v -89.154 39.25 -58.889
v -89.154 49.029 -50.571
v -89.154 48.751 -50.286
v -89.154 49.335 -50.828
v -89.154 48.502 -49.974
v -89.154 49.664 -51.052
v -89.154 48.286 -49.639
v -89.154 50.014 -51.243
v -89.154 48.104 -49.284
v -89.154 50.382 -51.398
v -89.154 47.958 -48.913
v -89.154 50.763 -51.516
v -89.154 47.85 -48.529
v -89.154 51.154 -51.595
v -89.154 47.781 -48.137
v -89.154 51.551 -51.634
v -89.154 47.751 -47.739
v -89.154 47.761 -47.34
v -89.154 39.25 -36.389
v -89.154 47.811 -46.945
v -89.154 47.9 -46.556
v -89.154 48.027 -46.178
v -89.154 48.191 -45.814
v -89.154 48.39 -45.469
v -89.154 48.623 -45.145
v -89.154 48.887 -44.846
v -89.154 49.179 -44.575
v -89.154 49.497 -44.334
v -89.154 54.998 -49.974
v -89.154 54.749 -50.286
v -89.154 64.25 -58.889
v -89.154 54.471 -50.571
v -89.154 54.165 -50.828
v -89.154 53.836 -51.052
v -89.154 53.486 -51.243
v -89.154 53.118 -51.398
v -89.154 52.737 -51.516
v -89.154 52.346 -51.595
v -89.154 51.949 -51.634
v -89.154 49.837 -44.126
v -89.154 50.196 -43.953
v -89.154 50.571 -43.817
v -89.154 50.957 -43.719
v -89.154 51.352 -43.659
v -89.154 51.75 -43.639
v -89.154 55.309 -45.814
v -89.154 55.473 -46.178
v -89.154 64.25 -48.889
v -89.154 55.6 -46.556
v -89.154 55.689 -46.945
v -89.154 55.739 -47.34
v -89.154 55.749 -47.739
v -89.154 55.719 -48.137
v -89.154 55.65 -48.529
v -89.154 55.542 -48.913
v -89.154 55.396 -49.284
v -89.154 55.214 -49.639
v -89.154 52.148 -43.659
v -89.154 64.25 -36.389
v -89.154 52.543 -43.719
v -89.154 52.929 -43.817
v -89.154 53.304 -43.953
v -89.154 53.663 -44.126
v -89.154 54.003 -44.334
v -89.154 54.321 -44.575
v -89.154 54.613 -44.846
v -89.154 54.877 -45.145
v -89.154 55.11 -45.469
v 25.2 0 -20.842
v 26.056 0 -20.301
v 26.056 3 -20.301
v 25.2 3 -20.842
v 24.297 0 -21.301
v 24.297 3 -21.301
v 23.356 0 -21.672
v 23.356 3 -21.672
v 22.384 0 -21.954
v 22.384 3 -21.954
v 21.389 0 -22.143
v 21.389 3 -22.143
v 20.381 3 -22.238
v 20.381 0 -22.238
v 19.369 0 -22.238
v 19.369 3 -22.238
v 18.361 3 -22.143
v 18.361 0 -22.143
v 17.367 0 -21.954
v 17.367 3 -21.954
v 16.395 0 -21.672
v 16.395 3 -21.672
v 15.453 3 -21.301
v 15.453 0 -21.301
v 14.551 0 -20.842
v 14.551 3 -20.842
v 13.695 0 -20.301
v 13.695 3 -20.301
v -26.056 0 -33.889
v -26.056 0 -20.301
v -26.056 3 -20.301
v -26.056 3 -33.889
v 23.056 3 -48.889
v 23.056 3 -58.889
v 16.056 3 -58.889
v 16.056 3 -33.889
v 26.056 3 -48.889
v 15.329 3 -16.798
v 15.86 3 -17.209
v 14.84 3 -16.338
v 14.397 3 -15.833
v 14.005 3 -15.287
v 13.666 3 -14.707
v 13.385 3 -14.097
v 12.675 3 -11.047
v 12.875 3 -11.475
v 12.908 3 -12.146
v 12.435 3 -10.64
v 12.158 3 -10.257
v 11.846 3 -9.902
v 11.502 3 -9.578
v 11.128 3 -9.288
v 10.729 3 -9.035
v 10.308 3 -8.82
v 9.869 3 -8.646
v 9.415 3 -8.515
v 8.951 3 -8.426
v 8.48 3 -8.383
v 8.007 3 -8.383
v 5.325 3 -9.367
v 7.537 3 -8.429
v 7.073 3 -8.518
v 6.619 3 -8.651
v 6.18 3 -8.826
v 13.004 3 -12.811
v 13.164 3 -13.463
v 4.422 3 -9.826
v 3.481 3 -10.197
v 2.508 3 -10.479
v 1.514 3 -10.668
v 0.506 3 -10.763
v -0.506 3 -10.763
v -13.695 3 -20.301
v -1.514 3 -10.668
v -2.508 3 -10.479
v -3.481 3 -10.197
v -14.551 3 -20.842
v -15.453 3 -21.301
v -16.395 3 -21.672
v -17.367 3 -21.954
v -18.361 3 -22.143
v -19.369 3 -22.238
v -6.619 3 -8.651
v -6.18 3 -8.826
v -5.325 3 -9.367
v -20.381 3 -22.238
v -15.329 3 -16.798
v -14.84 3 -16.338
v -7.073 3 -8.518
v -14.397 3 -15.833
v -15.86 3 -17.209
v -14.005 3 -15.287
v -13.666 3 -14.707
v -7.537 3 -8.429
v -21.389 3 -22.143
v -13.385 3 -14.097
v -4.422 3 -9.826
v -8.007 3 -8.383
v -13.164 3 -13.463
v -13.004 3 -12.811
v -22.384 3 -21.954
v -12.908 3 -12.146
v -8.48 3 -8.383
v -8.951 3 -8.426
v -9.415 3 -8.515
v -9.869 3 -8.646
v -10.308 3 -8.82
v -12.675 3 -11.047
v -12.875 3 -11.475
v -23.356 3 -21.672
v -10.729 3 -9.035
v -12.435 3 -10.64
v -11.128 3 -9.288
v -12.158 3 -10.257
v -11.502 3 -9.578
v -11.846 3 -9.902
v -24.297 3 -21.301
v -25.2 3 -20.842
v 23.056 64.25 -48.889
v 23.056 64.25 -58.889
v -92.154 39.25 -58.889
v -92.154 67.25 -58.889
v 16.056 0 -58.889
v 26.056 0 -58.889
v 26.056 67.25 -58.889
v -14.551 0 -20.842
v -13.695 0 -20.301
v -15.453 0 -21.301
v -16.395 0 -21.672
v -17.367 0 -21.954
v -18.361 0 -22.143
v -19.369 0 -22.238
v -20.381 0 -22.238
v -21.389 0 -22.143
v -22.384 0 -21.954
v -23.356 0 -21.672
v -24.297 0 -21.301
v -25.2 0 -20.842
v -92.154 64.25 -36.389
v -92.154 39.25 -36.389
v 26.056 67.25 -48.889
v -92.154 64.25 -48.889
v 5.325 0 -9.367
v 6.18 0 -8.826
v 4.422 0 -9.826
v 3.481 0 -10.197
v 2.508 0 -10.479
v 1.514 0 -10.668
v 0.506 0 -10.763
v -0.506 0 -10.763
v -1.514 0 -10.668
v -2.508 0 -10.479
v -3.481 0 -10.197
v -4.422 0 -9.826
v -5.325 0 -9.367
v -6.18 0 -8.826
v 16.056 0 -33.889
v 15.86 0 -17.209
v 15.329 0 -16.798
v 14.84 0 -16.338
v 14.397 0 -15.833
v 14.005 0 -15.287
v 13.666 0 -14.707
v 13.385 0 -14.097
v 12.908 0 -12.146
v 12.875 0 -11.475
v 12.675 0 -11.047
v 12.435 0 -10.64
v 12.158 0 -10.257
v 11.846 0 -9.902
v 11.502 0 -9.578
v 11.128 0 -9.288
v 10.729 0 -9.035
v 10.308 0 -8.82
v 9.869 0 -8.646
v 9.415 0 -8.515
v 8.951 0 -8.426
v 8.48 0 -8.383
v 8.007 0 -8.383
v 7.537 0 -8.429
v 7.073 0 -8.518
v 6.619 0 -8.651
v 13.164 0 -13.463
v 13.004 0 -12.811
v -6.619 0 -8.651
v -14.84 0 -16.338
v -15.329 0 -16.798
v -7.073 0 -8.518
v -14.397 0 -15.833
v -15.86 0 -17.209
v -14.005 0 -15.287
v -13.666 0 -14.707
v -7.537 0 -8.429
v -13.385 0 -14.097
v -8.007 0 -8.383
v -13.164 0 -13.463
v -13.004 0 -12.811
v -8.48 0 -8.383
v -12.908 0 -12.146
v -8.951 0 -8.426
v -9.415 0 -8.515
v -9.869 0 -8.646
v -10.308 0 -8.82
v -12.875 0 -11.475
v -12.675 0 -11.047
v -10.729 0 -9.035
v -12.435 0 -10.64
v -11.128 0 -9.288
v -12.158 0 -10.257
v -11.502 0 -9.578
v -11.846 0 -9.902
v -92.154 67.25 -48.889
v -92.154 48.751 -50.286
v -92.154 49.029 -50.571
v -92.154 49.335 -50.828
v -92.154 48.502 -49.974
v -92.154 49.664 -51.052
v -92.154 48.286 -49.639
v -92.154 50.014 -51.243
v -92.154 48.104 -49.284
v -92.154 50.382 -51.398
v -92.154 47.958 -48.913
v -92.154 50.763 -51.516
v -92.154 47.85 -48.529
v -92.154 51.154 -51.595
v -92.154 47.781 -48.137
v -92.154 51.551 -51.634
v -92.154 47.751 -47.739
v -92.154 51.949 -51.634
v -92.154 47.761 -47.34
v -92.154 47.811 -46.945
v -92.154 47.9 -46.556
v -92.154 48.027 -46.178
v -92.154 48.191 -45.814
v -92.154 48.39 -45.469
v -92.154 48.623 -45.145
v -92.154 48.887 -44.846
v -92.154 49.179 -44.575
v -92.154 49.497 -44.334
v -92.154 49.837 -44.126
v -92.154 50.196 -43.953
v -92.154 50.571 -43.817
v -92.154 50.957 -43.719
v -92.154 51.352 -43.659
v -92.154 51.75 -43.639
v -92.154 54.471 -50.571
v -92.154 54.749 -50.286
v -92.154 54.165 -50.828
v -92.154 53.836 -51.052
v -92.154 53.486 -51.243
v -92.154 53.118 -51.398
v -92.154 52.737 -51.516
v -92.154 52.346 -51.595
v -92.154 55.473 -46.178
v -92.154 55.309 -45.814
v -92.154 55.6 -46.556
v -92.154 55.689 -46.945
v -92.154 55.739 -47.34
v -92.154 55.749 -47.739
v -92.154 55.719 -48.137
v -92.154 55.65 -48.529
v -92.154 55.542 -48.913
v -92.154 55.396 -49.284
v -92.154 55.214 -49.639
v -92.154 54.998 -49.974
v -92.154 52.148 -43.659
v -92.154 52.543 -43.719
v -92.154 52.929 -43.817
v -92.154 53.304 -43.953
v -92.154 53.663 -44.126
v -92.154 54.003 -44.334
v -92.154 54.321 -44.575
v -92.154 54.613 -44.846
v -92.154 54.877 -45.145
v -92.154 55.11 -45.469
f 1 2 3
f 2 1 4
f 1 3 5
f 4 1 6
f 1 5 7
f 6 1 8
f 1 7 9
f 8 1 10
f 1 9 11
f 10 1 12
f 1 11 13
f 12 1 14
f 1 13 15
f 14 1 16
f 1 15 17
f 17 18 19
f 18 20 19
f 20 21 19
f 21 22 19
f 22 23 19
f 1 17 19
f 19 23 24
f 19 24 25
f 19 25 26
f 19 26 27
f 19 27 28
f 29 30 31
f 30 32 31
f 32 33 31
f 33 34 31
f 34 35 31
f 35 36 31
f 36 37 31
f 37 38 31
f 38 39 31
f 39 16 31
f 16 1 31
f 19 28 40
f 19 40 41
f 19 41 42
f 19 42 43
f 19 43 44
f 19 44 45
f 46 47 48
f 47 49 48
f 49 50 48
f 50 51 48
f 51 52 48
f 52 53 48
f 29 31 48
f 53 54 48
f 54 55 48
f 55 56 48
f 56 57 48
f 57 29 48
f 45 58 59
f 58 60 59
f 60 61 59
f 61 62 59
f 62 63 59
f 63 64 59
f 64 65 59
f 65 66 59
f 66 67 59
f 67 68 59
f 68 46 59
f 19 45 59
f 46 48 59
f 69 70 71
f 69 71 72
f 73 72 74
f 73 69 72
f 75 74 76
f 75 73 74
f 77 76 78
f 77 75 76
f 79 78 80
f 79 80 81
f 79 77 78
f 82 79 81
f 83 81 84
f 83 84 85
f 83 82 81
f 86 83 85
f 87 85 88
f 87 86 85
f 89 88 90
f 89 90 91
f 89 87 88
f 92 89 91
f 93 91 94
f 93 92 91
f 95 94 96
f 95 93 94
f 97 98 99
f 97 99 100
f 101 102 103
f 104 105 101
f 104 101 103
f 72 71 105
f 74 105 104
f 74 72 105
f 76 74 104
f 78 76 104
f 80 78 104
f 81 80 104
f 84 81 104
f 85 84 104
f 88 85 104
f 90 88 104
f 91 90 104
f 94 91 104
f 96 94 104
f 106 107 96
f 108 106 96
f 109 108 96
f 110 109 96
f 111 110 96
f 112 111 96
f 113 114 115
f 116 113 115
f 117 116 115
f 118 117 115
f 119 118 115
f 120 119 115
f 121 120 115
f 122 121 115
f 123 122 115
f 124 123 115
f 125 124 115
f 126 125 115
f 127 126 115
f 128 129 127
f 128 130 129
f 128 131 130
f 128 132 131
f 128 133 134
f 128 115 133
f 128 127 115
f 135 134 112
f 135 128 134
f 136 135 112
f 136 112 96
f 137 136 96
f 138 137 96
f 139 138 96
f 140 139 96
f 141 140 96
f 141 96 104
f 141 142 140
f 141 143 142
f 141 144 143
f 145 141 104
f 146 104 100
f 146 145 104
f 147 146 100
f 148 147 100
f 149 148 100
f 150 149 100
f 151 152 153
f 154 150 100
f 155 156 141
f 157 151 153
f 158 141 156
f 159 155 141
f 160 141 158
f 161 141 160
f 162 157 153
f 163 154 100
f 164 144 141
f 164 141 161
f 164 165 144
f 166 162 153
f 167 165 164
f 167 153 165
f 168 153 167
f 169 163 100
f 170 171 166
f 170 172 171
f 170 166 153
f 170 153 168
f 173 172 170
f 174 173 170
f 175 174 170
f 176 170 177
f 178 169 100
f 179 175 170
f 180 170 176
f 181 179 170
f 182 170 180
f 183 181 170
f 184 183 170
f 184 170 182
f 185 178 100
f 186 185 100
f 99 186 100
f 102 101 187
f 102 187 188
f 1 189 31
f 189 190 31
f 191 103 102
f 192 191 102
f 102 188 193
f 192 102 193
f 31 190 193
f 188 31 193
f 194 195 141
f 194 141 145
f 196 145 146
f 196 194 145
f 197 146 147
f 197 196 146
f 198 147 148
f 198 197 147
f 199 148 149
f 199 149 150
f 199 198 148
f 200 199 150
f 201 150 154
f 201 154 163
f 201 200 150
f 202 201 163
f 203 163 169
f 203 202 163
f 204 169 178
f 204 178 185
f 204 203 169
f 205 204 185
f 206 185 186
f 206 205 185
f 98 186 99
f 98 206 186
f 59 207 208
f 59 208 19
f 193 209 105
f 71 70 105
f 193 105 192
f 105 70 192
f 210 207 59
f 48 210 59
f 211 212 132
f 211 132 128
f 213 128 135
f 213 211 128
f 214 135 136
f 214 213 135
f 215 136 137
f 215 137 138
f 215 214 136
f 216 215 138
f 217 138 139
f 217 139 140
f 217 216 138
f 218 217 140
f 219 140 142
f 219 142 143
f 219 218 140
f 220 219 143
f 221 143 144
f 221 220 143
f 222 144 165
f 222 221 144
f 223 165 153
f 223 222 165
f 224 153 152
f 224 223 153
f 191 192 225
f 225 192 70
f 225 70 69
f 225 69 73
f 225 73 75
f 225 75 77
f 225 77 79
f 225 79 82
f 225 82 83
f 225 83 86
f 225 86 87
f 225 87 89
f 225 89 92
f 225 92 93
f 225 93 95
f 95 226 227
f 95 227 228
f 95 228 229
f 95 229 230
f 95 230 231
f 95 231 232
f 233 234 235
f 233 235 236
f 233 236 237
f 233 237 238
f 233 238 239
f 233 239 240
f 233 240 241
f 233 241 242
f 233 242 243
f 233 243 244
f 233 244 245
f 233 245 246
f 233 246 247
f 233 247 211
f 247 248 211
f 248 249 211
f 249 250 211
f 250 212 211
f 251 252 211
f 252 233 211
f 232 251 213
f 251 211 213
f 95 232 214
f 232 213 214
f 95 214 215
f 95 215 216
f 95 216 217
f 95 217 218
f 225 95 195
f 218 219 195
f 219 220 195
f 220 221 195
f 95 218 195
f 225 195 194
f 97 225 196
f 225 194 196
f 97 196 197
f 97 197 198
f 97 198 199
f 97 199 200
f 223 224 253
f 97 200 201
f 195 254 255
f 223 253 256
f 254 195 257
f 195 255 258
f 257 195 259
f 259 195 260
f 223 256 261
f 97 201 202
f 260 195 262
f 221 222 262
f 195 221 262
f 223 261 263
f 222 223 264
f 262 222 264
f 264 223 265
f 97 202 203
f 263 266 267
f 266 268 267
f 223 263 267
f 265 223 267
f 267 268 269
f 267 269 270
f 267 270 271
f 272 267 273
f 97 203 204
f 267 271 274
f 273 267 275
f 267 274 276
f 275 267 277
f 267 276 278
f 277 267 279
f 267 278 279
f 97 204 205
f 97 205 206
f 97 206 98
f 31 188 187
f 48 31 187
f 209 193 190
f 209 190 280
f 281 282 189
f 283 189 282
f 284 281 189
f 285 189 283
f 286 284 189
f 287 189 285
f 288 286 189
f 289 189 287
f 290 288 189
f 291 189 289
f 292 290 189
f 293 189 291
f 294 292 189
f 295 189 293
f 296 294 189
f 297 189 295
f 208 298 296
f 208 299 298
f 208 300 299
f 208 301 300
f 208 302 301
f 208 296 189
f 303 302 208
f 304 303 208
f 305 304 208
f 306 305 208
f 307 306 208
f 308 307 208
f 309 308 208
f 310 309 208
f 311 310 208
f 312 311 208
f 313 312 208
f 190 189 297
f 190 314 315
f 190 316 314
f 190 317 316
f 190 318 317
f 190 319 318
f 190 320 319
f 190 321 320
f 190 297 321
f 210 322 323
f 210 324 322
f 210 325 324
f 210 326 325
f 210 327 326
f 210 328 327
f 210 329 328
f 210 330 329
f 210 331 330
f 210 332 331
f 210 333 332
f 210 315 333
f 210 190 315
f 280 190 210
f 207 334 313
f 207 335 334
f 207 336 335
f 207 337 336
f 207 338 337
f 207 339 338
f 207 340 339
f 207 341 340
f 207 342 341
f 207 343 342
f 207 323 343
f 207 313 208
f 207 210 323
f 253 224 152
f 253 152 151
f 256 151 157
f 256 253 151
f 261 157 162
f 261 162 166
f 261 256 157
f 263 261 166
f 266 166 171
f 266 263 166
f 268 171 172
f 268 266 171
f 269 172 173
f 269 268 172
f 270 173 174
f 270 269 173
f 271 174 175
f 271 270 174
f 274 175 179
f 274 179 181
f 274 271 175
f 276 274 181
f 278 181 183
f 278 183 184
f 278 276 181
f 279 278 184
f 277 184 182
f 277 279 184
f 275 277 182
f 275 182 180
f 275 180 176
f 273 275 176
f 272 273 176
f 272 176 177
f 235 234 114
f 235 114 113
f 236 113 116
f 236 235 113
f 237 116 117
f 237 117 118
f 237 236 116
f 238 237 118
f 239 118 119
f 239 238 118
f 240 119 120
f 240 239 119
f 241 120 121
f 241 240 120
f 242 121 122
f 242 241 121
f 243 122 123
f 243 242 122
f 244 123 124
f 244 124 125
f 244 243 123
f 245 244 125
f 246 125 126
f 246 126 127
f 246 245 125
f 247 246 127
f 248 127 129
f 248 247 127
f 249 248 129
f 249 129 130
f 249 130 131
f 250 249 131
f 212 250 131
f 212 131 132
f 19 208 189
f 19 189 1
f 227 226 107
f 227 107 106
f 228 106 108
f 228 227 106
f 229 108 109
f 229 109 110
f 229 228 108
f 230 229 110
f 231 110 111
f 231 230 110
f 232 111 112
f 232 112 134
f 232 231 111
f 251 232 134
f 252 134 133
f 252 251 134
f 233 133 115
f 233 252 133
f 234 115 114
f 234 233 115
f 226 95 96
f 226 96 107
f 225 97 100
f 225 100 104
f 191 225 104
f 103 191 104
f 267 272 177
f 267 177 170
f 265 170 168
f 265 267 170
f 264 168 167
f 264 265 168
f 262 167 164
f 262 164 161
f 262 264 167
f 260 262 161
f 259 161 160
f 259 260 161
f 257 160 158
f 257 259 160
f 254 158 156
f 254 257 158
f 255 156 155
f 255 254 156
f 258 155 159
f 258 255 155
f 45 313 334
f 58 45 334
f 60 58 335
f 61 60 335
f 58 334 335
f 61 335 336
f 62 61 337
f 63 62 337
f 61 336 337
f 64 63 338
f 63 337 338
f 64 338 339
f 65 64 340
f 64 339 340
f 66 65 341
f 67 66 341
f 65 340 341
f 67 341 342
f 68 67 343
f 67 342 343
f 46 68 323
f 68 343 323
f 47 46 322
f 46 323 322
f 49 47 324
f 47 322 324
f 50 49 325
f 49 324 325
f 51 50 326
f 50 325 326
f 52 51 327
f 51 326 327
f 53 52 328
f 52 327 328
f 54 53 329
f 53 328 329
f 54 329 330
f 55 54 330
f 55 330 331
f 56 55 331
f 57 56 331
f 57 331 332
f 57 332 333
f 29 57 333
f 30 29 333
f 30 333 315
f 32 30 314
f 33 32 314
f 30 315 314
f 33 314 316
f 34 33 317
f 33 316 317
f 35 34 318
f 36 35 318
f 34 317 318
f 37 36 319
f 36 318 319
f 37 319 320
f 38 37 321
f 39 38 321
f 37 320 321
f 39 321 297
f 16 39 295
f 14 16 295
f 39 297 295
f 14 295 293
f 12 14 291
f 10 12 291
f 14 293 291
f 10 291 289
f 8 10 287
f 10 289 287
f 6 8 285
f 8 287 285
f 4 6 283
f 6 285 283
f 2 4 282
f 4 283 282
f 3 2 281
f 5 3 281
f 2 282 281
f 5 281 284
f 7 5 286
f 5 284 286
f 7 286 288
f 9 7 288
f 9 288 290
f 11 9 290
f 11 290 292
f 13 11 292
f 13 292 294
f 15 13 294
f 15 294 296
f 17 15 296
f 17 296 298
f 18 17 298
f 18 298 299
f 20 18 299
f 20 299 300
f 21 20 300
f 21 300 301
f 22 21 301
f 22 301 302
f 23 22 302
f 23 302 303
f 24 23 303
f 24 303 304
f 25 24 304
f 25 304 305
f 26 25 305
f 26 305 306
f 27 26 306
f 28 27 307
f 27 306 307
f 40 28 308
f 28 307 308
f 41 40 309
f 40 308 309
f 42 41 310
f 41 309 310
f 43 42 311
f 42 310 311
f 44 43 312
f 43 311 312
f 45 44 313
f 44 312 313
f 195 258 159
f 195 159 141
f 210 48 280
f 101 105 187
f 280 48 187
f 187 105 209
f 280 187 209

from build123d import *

# Parameters (mm, degrees)
BOSS_EXTRUDE1_DEPTH = 3
SKETCH3_W           = 10
SKETCH3_H           = 3
BOSS_EXTRUDE2_DEPTH = 25
SKETCH5_W           = 3
SKETCH5_H           = 10
BOSS_EXTRUDE4_DEPTH = 64.25
SKETCH7_W           = 10
SKETCH7_H           = 3
BOSS_EXTRUDE5_DEPTH = 115.21
SKETCH8_W           = 3
SKETCH8_H           = 22.5
BOSS_EXTRUDE6_DEPTH = 25
SKETCH10_R          = 4
CUT_EXTRUDE1_DEPTH  = 3


with BuildPart() as part:
    # Sketch2 → Boss-Extrude1 (new body)
    with BuildSketch(Plane(origin=(0, 0, 0), x_dir=(1, 0, 0), z_dir=(0, 1, 0))):
        with BuildLine():
            Line((-15.860247962, 17.20906431), (-13.694996915, 20.301363277))
            ThreePointArc((-13.694996915, 20.301363277), (-19.875283017, 22.25), (-26.055569119, 20.301363277))
            Line((-26.055569119, 20.301363277), (-26.055569119, 33.889213566))
            Line((-26.055569119, 33.889213566), (26.055569119, 33.889213566))
            Line((26.055569119, 33.889213566), (26.055569119, 20.301363277))
            ThreePointArc((26.055569119, 20.301363277), (19.875283017, 22.25), (13.694996915, 20.301363277))
            Line((13.694996915, 20.301363277), (15.860247962, 17.20906431))
            ThreePointArc((15.860247962, 17.20906431), (13.666207185, 14.707240293), (12.875283017, 11.475))
            ThreePointArc((12.875283017, 11.475), (10.090653959, 8.727908609), (6.180286102, 8.826363277))
            ThreePointArc((6.180286102, 8.826363277), (0, 10.775), (-6.180286102, 8.826363277))
            ThreePointArc((-6.180286102, 8.826363277), (-10.090653959, 8.727908609), (-12.875283017, 11.475))
            ThreePointArc((-12.875283017, 11.475), (-13.666207185, 14.707240293), (-15.860247962, 17.20906431))
        make_face()
    extrude(amount=BOSS_EXTRUDE1_DEPTH)

    # Sketch3 → Boss-Extrude2 (add)
    with BuildSketch(Plane(origin=(0, 0, -33.889213566), x_dir=(-1, 0, 0), z_dir=(0, 0, -1))):
        with Locations((-21.055569119, 1.5)):
            Rectangle(SKETCH3_W, SKETCH3_H)
    extrude(amount=BOSS_EXTRUDE2_DEPTH)

    # Sketch5 → Boss-Extrude4 (add)
    with BuildSketch(Plane(origin=(0, 3, 0), x_dir=(1, 0, 0), z_dir=(0, 1, 0))):
        with Locations((24.555569119, 53.889213566)):
            Rectangle(SKETCH5_W, SKETCH5_H)
    extrude(amount=BOSS_EXTRUDE4_DEPTH)

    # Sketch7 → Boss-Extrude5 (add)
    with BuildSketch(Plane.ZY.offset(-23.055569119)):
        with Locations((-53.889213566, 65.75)):
            Rectangle(SKETCH7_W, SKETCH7_H)
    extrude(amount=BOSS_EXTRUDE5_DEPTH)

    # Sketch8 → Boss-Extrude6 (add)
    with BuildSketch(Plane.XZ.offset(-64.25)):
        with Locations((-90.654430881, -47.639213566)):
            Rectangle(SKETCH8_W, SKETCH8_H)
    extrude(amount=BOSS_EXTRUDE6_DEPTH)

    # Sketch10 → Cut-Extrude1 (cut)
    with BuildSketch(Plane.ZY.offset(92.154430881)):
        with Locations((-47.639213566, 51.75)):
            Circle(SKETCH10_R)
    extrude(amount=-CUT_EXTRUDE1_DEPTH, mode=Mode.SUBTRACT)


solid = part.part
